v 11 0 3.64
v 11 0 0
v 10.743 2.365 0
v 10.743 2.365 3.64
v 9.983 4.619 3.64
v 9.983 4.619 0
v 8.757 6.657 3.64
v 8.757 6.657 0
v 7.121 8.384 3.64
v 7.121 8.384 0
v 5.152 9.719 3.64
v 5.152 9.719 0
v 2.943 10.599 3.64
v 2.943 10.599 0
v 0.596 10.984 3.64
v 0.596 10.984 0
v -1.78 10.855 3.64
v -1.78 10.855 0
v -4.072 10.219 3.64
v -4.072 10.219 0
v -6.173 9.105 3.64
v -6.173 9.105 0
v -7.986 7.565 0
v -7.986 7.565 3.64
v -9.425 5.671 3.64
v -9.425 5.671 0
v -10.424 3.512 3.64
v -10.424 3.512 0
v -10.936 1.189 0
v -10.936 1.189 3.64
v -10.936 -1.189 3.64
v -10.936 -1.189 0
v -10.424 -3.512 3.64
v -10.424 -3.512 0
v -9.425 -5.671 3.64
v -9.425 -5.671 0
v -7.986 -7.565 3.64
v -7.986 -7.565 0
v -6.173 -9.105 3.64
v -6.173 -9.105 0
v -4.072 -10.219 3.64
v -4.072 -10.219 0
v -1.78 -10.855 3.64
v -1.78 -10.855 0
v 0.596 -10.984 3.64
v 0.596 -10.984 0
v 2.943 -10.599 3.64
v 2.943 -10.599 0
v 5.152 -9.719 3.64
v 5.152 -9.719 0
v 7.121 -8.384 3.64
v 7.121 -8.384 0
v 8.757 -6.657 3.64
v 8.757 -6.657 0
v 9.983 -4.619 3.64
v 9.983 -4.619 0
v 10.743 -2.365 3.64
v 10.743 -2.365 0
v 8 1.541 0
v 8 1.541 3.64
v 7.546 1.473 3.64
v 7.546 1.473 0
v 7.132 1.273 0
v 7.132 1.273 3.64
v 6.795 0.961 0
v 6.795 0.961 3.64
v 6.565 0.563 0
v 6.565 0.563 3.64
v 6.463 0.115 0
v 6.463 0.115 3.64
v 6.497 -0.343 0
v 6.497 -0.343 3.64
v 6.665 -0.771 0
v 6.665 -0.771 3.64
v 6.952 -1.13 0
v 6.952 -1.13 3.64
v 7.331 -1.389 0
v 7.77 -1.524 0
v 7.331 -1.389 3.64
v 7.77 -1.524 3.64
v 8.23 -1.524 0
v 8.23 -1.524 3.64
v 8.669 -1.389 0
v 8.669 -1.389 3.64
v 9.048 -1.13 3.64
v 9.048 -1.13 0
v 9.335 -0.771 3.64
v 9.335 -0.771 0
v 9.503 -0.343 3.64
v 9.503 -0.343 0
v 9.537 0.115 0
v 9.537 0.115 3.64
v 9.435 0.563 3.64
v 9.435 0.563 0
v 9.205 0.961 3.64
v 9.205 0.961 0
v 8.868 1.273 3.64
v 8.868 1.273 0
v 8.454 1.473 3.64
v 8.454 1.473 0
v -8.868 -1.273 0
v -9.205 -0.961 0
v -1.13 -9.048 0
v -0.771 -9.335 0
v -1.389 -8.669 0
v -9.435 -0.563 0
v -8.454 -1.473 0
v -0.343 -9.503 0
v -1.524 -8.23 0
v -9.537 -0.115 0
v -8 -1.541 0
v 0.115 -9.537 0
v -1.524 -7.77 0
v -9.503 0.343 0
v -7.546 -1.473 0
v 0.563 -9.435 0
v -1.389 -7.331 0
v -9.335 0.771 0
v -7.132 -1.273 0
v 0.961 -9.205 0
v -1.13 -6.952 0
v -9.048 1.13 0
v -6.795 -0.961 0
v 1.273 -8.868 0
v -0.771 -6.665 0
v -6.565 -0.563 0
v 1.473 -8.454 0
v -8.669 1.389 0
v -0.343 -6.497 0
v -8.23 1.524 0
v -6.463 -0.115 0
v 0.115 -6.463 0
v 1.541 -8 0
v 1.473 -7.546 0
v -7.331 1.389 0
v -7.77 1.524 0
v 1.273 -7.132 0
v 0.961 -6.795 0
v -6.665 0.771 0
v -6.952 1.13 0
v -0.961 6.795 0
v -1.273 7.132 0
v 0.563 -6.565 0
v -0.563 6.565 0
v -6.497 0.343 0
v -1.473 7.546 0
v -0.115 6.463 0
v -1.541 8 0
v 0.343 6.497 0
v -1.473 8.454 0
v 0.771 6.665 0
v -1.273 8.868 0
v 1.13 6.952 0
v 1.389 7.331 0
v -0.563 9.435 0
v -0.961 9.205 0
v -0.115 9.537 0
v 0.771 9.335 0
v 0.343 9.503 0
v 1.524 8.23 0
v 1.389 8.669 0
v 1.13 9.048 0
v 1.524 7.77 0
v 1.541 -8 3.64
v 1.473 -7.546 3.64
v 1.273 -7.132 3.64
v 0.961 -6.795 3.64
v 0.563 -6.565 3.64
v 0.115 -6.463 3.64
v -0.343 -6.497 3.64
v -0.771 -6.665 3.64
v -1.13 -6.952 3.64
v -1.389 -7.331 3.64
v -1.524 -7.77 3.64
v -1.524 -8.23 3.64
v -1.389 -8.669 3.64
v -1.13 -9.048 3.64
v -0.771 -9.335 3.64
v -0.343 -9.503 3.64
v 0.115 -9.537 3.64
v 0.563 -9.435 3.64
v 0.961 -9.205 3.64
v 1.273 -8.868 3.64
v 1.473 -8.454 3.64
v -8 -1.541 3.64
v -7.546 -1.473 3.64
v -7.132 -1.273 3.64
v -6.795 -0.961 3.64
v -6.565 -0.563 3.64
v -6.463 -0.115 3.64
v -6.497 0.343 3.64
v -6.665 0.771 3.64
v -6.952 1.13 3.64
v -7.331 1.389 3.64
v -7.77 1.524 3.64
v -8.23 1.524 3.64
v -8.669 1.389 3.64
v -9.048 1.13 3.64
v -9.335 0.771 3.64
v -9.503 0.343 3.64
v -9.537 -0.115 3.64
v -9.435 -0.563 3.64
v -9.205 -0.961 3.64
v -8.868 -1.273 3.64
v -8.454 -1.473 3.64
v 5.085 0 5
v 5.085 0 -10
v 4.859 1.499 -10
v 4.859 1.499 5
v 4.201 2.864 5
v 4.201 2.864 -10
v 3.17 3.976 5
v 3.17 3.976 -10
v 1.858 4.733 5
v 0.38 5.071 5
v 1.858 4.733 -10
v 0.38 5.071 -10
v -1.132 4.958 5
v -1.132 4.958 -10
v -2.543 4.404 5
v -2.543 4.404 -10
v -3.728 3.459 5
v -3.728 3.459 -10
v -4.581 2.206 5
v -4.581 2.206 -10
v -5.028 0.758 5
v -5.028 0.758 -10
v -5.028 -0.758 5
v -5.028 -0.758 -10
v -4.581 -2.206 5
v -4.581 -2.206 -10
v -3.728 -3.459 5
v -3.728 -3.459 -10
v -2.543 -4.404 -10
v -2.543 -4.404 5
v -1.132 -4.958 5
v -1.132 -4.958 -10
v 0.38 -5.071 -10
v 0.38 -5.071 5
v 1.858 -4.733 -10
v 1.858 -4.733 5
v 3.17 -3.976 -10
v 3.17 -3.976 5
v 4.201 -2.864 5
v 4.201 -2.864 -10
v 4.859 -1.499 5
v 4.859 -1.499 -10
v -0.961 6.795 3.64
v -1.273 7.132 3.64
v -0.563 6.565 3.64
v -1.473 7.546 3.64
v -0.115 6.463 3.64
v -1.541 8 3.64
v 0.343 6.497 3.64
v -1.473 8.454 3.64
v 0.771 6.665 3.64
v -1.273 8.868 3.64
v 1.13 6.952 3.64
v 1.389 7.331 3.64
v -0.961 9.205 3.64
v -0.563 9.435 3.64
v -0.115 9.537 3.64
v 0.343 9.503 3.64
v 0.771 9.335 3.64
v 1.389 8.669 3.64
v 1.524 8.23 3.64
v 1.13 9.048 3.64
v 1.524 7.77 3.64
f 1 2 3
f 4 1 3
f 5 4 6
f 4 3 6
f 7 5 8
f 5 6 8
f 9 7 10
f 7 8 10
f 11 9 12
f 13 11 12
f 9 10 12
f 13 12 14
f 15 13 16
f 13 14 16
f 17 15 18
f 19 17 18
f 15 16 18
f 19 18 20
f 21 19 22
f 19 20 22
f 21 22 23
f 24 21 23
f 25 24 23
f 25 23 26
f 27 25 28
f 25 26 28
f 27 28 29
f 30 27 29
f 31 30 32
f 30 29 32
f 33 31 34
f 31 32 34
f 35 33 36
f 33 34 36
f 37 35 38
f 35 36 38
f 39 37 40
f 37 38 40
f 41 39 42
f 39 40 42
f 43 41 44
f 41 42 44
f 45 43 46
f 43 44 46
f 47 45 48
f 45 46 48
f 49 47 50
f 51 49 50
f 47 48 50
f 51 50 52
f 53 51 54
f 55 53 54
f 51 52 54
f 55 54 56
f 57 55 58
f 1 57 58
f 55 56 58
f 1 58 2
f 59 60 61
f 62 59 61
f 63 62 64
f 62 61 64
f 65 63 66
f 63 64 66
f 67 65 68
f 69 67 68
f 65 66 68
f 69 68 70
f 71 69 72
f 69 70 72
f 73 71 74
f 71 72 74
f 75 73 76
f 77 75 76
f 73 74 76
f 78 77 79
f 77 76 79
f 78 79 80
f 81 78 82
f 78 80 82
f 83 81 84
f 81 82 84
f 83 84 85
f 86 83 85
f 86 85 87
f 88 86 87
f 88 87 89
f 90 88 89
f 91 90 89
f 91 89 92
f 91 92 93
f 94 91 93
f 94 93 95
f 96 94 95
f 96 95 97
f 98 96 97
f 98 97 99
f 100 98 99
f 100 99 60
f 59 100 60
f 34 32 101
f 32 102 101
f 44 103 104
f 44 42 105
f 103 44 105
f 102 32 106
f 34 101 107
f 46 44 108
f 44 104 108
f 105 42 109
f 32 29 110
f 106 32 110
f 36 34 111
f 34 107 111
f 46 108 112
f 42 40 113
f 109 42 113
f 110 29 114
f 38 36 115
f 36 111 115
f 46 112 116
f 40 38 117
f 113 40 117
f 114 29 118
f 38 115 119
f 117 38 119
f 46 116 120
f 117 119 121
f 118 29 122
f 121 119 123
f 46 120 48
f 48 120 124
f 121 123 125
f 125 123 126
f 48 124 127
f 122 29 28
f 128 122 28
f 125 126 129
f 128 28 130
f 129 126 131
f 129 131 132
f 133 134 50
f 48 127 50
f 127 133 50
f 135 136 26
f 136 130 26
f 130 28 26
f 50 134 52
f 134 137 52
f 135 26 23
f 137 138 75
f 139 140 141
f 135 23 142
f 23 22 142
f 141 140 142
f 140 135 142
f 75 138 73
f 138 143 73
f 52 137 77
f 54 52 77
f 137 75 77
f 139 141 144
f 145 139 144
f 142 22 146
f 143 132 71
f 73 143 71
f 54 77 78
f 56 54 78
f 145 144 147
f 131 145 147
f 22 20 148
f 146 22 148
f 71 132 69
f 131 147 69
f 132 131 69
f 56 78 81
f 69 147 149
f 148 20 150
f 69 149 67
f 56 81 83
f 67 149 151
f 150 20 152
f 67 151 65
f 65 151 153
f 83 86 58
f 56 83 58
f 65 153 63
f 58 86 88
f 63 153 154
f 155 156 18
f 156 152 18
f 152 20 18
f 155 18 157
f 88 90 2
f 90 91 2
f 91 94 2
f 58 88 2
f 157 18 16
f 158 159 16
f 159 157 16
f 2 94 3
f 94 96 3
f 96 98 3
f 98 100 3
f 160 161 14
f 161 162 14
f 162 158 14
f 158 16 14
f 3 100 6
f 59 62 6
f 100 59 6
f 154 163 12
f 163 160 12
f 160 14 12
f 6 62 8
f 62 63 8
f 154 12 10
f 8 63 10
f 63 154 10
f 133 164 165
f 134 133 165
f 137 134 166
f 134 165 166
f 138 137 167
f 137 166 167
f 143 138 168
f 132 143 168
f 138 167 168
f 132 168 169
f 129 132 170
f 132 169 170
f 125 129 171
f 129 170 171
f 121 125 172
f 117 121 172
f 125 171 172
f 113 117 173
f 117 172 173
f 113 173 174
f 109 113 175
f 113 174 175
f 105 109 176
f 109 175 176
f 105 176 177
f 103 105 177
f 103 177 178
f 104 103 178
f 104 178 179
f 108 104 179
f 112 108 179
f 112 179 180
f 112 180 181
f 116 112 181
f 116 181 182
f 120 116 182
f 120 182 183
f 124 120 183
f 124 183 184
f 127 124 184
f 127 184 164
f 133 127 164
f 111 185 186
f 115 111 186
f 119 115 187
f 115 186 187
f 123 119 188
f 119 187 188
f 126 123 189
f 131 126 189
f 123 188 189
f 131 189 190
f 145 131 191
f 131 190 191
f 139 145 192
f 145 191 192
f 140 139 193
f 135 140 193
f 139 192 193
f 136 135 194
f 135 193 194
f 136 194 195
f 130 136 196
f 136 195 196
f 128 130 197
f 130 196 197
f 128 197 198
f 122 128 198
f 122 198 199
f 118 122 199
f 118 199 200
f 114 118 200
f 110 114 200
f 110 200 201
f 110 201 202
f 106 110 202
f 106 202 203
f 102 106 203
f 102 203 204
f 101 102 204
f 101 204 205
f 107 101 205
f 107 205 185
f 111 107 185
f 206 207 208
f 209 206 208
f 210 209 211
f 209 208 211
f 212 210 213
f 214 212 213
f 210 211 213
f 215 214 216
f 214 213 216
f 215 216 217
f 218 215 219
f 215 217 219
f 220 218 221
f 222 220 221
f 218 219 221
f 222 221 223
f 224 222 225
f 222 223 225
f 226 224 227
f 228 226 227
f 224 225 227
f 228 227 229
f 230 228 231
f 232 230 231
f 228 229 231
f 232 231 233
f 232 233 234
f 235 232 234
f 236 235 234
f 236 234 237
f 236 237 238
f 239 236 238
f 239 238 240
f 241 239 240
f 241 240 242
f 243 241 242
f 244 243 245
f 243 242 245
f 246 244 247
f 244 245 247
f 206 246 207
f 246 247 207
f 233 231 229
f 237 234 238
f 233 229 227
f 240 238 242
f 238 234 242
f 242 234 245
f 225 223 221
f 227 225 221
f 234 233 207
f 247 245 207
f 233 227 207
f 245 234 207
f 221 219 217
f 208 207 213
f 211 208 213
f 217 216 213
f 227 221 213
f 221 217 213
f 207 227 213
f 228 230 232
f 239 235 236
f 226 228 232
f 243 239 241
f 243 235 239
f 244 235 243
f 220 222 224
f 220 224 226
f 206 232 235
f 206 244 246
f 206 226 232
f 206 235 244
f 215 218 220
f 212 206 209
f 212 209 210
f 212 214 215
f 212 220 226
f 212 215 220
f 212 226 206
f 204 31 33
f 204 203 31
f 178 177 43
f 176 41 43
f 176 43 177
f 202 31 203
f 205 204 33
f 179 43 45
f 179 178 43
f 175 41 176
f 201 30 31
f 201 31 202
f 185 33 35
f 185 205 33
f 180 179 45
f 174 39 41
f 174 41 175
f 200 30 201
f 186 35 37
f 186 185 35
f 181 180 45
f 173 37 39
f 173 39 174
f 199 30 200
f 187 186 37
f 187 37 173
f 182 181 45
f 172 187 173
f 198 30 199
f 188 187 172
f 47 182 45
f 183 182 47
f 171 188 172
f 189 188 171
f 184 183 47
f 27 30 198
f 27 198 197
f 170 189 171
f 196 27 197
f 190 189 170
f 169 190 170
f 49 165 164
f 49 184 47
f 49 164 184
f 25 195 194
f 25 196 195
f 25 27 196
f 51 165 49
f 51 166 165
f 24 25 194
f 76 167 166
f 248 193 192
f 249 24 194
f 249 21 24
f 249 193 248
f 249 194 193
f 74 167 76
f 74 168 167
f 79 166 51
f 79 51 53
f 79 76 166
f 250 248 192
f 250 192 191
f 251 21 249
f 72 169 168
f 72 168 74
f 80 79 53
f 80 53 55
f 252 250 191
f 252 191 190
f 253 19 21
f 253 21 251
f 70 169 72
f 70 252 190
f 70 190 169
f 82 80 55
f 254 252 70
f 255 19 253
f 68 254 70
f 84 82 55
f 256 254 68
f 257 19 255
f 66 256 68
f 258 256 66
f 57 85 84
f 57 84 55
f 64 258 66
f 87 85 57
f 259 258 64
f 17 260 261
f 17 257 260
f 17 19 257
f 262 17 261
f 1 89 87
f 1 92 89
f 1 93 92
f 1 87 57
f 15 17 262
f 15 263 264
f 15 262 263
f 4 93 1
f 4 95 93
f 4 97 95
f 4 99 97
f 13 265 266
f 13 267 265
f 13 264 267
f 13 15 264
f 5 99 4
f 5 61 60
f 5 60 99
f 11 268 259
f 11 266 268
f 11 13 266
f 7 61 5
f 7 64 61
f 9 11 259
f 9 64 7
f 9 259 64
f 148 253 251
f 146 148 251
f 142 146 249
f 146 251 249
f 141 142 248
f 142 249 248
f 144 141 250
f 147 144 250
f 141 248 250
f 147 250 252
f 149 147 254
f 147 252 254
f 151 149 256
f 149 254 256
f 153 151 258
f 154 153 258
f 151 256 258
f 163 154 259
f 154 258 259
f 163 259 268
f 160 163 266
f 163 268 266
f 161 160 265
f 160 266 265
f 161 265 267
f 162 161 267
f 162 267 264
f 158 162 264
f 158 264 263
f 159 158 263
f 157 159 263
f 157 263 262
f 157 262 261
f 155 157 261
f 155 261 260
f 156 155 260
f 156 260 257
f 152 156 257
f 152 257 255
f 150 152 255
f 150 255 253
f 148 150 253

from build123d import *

# Parameters (mm, degrees)
CYLINDER001_R      = 5.085
CYLINDER001_DEPTH  = 15
CYLINDER_R         = 11
CYLINDER_DEPTH     = 3.64
SKETCH_R           = 1.541271
POCKET_DEPTH       = 66.290808
POLARPATTERN_COUNT = 4


with BuildPart() as cylinder001:
    # Cylinder001 → Cylinder001 (new body)
    with BuildSketch(Plane.XY.offset(-10)):
        Circle(CYLINDER001_R)
    extrude(amount=CYLINDER001_DEPTH)


with BuildPart() as polarpattern:
    # Cylinder → Cylinder (new body)
    with BuildSketch(Plane.XY):
        Circle(CYLINDER_R)
    extrude(amount=CYLINDER_DEPTH)

    # Sketch → Pocket (cut, through all)
    with BuildSketch(Plane.XY.offset(3.64)):
        with Locations((0, -8)):
            Circle(SKETCH_R)
    pocket = extrude(amount=-POCKET_DEPTH, mode=Mode.SUBTRACT)

    # PolarPattern: Pocket ×4 about axis
    polarpattern_axis = Axis((0, 0, 3.64), (0, 0, 1))
    for i in range(1, POLARPATTERN_COUNT):
        add(pocket.rotate(polarpattern_axis, i * 360 / POLARPATTERN_COUNT), mode=Mode.SUBTRACT)


solid = Compound([cylinder001.part, polarpattern.part])
